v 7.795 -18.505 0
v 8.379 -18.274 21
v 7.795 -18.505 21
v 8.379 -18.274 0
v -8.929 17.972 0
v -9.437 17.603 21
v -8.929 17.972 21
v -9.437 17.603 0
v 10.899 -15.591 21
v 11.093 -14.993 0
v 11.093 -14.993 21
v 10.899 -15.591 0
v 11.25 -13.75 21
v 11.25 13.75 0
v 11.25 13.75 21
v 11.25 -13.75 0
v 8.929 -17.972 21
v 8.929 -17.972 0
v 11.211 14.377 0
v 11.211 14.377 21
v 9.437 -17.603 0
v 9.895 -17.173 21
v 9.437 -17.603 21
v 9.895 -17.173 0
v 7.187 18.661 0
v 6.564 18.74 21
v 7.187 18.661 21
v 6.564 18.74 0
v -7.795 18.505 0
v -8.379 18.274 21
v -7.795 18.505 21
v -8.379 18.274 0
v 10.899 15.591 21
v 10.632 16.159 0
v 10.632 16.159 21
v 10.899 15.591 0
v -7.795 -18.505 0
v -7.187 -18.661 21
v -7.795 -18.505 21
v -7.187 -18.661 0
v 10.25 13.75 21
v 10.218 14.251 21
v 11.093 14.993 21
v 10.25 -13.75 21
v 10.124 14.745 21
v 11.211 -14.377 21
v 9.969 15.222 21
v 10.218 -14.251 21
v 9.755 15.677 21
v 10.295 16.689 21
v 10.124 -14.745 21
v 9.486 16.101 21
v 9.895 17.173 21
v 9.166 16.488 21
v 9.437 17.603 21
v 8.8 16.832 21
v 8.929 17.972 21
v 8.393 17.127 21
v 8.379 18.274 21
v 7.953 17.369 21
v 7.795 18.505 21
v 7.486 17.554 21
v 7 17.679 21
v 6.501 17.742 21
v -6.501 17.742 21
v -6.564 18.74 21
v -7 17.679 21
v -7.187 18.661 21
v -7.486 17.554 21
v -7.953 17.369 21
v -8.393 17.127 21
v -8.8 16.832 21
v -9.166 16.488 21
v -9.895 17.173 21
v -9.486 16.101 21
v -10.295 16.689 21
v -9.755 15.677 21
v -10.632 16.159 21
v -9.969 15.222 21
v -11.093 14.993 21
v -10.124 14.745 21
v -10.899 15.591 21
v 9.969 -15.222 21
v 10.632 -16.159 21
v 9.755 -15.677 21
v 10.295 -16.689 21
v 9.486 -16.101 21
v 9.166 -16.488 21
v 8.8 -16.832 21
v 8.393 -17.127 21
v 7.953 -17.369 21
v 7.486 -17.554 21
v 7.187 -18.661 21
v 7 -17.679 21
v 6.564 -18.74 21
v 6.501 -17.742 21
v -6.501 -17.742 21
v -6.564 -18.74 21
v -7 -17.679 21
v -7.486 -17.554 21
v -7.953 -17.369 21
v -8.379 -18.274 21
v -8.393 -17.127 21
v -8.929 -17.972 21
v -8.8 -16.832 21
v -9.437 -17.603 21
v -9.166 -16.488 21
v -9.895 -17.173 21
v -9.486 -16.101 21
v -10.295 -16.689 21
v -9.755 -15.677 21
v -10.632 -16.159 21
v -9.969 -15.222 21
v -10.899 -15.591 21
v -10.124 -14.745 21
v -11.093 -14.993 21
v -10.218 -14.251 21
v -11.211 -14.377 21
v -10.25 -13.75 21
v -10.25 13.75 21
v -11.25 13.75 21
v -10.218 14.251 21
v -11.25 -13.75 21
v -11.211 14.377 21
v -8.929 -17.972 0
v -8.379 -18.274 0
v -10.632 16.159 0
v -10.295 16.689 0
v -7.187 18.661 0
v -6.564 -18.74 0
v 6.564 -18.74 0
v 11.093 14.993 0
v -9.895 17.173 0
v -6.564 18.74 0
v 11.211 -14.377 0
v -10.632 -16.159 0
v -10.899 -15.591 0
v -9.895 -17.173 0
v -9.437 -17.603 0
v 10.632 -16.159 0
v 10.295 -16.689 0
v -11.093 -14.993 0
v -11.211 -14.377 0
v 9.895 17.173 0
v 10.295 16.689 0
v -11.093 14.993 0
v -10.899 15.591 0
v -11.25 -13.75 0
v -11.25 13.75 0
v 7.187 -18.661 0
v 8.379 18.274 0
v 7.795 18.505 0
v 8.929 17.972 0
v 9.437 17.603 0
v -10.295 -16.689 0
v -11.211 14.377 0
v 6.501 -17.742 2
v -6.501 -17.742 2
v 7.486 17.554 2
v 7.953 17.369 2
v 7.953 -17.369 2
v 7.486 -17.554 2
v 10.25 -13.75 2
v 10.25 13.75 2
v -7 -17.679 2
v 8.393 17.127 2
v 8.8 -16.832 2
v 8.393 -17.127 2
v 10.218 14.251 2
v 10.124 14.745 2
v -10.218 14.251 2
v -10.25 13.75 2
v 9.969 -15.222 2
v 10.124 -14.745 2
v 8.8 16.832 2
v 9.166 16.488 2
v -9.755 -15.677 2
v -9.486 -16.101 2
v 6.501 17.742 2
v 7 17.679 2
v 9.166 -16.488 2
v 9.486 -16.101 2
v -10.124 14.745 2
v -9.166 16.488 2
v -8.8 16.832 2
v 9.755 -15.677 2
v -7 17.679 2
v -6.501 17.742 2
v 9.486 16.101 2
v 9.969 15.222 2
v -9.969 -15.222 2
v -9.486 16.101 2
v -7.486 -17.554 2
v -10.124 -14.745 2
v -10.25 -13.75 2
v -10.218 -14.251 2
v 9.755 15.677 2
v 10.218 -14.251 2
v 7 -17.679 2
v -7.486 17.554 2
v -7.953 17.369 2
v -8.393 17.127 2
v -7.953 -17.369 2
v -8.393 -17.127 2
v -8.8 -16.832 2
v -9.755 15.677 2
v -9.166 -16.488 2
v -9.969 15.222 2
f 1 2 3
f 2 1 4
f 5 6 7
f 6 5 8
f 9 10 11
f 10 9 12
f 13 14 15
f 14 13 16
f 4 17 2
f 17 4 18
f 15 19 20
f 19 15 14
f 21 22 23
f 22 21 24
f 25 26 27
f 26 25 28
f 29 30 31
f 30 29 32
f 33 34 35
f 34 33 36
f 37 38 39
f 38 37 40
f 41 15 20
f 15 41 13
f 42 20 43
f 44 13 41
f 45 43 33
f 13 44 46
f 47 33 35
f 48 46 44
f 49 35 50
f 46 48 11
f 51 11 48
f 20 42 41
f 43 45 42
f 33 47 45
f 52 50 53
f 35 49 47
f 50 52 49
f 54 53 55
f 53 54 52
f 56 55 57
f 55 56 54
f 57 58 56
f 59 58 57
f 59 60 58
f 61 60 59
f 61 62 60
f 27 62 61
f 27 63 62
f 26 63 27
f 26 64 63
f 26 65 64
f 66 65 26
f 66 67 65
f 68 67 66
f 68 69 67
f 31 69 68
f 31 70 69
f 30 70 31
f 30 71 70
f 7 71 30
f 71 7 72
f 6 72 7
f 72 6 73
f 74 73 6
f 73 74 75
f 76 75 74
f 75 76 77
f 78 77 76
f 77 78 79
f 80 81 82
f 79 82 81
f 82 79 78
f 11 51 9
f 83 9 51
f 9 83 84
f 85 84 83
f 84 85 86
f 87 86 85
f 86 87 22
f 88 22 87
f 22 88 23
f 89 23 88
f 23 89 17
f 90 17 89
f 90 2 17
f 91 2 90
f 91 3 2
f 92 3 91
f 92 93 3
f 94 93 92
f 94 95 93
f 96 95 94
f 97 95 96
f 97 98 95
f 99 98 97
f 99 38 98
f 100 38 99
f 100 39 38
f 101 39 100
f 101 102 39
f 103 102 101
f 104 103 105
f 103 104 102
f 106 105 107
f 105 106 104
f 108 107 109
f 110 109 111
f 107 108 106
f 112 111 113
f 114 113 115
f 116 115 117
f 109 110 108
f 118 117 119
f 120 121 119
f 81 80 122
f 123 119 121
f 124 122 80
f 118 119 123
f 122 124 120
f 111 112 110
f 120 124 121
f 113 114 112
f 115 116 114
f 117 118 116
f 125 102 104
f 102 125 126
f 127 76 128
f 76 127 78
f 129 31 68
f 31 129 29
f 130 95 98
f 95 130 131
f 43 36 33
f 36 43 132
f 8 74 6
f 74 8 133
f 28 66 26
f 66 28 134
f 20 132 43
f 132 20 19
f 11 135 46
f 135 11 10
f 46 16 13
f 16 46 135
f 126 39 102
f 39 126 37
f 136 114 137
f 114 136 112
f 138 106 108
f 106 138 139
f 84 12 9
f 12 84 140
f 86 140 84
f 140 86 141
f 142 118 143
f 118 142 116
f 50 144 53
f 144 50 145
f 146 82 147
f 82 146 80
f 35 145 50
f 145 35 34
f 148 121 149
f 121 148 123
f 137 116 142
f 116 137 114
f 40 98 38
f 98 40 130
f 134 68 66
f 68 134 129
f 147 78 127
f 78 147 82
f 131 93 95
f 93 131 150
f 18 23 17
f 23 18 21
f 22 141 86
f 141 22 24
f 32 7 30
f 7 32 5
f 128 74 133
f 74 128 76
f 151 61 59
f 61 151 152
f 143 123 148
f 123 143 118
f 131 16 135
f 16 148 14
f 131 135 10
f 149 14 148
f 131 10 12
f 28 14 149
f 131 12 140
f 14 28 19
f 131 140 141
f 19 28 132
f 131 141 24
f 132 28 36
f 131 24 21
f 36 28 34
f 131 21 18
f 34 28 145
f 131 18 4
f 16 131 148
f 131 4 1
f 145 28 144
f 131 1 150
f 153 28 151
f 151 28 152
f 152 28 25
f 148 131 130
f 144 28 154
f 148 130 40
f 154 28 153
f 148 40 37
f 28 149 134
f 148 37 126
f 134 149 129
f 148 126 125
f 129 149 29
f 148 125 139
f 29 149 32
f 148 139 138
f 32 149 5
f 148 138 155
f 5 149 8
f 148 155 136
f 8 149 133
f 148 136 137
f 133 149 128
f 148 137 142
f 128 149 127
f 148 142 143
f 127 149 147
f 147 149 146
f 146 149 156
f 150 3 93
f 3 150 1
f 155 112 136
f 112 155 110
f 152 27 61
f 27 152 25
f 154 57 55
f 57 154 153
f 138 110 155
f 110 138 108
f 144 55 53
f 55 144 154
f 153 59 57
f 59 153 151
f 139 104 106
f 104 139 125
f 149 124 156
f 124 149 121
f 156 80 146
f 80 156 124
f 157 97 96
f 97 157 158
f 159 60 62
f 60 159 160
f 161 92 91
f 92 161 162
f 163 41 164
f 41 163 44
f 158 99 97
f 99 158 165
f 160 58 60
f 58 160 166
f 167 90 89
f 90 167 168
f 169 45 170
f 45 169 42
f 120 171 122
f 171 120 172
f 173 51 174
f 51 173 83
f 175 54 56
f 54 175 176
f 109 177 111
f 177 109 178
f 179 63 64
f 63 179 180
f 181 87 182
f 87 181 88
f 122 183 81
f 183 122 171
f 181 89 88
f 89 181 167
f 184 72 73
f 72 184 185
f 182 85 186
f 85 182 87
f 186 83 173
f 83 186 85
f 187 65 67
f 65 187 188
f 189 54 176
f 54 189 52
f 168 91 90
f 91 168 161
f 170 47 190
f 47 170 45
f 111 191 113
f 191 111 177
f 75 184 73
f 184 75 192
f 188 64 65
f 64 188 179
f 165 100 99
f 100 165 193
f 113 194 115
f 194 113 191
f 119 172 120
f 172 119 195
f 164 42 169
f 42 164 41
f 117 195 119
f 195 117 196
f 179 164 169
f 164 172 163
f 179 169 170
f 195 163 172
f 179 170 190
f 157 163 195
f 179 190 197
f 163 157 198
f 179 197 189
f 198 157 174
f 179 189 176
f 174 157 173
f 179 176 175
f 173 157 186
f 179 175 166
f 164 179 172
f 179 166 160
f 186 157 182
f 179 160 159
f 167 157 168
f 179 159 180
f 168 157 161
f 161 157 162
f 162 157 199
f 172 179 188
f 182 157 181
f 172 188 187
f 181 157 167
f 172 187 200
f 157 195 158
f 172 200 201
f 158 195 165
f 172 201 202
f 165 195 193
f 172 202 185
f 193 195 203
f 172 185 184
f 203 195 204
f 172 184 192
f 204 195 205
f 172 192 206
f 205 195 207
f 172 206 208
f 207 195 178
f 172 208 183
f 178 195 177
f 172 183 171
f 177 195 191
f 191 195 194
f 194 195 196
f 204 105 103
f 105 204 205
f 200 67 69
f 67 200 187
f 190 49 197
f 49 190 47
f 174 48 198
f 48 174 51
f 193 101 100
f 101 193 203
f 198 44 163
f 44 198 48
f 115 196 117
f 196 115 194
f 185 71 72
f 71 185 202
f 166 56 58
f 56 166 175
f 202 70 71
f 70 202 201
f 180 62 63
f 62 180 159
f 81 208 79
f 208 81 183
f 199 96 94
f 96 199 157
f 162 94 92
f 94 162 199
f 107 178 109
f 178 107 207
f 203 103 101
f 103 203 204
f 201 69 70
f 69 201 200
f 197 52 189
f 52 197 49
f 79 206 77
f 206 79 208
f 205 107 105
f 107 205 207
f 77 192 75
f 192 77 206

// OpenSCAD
$fn = 50;


difference() {
	union() {
		hull() {
			translate(v = [-6.2500000000, 13.7500000000, 0]) {
				cylinder(h = 21, r = 5);
			}
			translate(v = [6.2500000000, 13.7500000000, 0]) {
				cylinder(h = 21, r = 5);
			}
			translate(v = [-6.2500000000, -13.7500000000, 0]) {
				cylinder(h = 21, r = 5);
			}
			translate(v = [6.2500000000, -13.7500000000, 0]) {
				cylinder(h = 21, r = 5);
			}
		}
	}
	union() {
		translate(v = [0, 0, 2]) {
			hull() {
				translate(v = [-6.2500000000, 13.7500000000, 0]) {
					cylinder(h = 19, r = 4);
				}
				translate(v = [6.2500000000, 13.7500000000, 0]) {
					cylinder(h = 19, r = 4);
				}
				translate(v = [-6.2500000000, -13.7500000000, 0]) {
					cylinder(h = 19, r = 4);
				}
				translate(v = [6.2500000000, -13.7500000000, 0]) {
					cylinder(h = 19, r = 4);
				}
			}
		}
	}
}
